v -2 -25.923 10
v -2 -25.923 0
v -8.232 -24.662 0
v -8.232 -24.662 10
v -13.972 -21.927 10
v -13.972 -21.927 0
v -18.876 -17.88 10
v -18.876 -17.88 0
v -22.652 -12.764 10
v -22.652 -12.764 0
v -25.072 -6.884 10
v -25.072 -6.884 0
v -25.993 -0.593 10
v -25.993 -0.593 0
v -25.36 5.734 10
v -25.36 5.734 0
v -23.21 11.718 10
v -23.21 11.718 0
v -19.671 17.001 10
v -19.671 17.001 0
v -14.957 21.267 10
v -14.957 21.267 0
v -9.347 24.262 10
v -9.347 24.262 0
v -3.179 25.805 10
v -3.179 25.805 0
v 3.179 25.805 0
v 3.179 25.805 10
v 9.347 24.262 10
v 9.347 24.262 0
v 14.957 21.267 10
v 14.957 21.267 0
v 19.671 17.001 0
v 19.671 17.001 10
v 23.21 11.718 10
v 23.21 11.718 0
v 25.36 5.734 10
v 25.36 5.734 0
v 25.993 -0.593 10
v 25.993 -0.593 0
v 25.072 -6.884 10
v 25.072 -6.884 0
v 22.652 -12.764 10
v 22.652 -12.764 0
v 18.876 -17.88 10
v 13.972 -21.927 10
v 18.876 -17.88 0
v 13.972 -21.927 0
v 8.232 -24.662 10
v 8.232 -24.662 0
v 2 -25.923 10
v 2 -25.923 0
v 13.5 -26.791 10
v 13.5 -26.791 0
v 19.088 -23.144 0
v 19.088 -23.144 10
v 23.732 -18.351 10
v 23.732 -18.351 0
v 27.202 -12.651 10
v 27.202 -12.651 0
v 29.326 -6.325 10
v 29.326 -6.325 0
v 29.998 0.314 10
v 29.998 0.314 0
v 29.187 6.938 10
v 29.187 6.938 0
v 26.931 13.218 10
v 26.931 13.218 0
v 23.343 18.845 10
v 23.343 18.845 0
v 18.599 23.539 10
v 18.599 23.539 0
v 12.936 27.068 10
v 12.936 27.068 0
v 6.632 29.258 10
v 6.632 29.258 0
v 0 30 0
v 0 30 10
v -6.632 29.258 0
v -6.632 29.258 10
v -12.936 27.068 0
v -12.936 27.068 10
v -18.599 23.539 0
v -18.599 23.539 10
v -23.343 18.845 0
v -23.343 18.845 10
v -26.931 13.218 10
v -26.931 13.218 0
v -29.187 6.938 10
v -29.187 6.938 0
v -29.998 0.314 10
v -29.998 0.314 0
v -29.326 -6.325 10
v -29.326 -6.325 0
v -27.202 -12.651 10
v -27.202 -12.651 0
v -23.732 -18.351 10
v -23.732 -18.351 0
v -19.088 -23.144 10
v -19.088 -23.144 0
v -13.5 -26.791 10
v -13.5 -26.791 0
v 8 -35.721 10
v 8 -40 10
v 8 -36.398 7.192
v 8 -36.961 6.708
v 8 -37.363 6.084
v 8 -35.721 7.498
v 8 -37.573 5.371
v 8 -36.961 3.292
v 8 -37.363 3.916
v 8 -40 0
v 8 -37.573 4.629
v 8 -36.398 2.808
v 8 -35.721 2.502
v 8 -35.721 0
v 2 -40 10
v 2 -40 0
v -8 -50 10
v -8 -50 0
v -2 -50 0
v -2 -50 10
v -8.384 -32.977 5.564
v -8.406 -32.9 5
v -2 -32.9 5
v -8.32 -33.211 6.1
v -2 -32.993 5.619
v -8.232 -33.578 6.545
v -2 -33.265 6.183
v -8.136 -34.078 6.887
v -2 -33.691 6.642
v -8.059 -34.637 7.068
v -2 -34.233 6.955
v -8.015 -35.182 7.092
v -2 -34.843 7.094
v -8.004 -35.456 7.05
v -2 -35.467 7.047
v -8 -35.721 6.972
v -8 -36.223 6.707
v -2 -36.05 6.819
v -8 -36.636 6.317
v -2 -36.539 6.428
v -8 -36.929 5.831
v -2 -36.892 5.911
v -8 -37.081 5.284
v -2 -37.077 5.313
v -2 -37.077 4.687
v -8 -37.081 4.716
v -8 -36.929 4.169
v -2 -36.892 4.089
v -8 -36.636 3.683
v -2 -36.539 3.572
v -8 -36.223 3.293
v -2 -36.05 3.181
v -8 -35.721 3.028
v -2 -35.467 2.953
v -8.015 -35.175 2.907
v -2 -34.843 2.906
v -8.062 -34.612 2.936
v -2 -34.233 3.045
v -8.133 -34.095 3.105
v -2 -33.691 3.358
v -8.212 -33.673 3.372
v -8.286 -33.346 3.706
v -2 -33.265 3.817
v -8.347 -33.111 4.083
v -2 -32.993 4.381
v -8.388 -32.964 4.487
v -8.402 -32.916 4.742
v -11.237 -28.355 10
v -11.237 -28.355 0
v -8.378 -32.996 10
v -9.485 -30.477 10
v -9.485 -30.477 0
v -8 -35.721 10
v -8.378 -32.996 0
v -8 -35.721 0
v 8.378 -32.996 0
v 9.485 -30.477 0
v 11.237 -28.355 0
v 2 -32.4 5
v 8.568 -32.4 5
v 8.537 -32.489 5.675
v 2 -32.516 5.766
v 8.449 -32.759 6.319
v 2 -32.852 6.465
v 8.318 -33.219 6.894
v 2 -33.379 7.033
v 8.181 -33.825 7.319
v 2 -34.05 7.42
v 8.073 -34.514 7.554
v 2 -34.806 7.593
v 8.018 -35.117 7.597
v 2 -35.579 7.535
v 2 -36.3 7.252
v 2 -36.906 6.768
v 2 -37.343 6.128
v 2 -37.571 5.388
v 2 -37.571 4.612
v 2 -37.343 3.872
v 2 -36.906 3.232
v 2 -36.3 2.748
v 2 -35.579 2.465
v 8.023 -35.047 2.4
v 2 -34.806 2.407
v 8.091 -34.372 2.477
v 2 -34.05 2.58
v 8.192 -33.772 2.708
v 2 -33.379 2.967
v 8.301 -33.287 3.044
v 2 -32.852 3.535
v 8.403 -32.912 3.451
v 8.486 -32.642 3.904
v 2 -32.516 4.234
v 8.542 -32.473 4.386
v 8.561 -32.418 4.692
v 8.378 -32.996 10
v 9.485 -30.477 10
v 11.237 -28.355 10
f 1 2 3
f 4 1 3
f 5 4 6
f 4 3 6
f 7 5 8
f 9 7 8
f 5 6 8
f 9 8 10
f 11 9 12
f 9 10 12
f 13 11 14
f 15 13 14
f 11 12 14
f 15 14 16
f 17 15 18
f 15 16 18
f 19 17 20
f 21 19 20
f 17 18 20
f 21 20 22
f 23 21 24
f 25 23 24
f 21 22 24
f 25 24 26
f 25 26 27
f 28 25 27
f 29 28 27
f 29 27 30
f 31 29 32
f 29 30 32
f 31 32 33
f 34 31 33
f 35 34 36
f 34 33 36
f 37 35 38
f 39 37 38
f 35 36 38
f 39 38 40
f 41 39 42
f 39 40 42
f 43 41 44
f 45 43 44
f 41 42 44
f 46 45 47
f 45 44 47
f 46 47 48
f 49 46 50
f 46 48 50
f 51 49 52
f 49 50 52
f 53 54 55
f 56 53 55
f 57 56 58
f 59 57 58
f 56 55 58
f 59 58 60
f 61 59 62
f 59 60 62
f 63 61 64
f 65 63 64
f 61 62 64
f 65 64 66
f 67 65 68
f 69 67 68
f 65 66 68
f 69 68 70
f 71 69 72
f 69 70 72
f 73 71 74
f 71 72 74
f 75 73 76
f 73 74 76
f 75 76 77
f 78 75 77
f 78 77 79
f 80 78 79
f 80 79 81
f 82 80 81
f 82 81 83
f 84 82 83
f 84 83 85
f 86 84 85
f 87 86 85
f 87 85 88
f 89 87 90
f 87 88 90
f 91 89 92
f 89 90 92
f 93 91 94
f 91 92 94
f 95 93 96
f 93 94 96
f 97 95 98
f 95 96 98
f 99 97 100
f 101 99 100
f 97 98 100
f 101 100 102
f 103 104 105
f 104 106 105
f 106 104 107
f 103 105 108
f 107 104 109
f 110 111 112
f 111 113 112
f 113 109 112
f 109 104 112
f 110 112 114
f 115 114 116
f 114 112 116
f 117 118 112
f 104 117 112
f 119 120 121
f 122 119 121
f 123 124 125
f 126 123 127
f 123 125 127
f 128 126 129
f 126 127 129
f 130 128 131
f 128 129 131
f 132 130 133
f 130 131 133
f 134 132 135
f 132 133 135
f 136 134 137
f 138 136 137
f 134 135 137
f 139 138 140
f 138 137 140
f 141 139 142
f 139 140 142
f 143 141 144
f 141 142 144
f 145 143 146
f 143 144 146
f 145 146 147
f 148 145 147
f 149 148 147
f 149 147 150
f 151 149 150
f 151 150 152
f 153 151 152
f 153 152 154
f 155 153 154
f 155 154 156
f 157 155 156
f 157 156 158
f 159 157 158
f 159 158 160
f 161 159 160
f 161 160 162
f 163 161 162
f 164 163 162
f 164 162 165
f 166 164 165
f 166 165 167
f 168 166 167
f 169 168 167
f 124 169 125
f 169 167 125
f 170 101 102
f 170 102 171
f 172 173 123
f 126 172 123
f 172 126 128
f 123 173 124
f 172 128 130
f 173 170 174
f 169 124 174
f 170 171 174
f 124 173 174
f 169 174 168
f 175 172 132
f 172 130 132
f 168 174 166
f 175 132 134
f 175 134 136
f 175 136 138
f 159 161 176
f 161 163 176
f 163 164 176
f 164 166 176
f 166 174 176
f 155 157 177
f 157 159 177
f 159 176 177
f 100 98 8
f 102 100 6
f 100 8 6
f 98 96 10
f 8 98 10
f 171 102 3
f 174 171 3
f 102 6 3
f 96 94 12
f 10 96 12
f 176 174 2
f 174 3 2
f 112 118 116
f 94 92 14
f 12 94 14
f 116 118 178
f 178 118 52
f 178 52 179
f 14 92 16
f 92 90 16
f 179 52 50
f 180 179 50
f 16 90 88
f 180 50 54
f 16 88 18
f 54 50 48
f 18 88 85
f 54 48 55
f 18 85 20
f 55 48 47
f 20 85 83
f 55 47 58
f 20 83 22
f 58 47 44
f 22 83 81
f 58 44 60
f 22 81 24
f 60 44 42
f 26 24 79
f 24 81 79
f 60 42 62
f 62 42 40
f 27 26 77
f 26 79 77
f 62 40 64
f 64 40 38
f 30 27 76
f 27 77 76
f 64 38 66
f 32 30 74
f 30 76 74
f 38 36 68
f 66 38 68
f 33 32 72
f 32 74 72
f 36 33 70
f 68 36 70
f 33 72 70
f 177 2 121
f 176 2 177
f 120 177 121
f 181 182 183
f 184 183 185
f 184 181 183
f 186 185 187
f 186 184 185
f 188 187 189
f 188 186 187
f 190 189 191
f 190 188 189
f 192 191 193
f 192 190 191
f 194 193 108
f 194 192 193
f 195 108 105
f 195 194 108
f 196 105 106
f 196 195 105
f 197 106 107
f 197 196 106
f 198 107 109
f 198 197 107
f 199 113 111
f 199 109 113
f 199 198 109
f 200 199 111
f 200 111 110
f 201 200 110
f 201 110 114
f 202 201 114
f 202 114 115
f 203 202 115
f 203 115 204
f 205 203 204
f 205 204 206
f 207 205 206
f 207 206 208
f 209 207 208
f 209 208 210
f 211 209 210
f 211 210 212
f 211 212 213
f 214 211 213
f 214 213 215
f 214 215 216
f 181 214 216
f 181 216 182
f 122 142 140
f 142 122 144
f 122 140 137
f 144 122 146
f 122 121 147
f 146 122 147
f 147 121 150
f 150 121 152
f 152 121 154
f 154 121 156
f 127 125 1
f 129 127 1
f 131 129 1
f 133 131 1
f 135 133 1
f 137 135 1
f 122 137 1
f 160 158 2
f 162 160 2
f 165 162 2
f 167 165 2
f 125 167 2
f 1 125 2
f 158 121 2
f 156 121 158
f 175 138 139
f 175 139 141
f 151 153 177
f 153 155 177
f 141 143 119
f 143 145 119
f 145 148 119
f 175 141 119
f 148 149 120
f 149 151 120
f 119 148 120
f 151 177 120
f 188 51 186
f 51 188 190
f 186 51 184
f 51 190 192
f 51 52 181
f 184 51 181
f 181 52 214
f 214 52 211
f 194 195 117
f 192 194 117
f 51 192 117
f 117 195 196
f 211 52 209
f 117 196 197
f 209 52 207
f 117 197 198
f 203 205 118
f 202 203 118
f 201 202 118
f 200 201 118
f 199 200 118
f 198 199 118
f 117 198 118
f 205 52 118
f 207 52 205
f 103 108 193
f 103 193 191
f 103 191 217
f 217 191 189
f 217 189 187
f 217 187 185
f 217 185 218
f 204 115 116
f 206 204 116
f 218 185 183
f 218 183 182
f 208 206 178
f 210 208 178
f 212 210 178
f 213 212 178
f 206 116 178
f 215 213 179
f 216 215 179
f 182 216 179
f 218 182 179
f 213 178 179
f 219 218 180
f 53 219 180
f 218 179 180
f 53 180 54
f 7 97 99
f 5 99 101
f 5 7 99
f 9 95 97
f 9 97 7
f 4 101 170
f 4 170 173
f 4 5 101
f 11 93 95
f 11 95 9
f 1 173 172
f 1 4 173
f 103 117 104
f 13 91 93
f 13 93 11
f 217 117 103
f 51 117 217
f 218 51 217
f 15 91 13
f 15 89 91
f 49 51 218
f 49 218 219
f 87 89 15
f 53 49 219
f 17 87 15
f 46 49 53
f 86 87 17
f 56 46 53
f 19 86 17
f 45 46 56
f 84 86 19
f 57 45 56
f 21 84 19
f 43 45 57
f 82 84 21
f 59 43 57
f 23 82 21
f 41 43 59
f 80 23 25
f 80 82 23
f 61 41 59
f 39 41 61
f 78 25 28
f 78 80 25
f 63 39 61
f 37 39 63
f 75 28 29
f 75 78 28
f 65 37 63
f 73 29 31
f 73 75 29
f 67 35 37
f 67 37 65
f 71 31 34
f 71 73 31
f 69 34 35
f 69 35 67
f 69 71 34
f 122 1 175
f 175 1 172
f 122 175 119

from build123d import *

# Parameters (mm, degrees)
F1_DEPTH = 10
F3_DEPTH = 25
F4_R     = 2.6
F5_DEPTH = 25


with BuildPart() as f1:
    # F0 (on Top) → F1 (new body)
    with BuildSketch(Plane.XY):
        with BuildLine():
            ThreePointArc((-2, -25.922963), (0, 26), (2, -25.922963))
            Line((2, -25.922963), (2, -40))
            Line((2, -40), (8, -40))
            Line((8, -40), (8, -35.721142))
            ThreePointArc((8, -35.721142), (9.485307, -30.477098), (13.5, -26.790857))
            ThreePointArc((13.5, -26.790857), (0, 30), (-13.5, -26.790857))
            ThreePointArc((-13.5, -26.790857), (-9.485307, -30.477098), (-8, -35.721142))
            Line((-8, -35.721142), (-8, -50))
            Line((-8, -50), (-2, -50))
            Line((-2, -50), (-2, -25.922963))
        make_face()
    extrude(amount=F1_DEPTH)

    # F2 (on Right) → F3 (cut)
    with BuildSketch(Plane.YZ):
        with BuildLine():
            ThreePointArc((-37.1, 5), (-35, 2.9), (-32.9, 5))
            ThreePointArc((-32.9, 5), (-35, 7.1), (-37.1, 5))
        make_face()
    extrude(amount=-F3_DEPTH, mode=Mode.SUBTRACT)

    # F4 (on Right) → F5 (cut)
    with BuildSketch(Plane.YZ):
        with Locations((-35, 5)):
            Circle(F4_R)
    extrude(amount=F5_DEPTH, mode=Mode.SUBTRACT)


solid = f1.part
